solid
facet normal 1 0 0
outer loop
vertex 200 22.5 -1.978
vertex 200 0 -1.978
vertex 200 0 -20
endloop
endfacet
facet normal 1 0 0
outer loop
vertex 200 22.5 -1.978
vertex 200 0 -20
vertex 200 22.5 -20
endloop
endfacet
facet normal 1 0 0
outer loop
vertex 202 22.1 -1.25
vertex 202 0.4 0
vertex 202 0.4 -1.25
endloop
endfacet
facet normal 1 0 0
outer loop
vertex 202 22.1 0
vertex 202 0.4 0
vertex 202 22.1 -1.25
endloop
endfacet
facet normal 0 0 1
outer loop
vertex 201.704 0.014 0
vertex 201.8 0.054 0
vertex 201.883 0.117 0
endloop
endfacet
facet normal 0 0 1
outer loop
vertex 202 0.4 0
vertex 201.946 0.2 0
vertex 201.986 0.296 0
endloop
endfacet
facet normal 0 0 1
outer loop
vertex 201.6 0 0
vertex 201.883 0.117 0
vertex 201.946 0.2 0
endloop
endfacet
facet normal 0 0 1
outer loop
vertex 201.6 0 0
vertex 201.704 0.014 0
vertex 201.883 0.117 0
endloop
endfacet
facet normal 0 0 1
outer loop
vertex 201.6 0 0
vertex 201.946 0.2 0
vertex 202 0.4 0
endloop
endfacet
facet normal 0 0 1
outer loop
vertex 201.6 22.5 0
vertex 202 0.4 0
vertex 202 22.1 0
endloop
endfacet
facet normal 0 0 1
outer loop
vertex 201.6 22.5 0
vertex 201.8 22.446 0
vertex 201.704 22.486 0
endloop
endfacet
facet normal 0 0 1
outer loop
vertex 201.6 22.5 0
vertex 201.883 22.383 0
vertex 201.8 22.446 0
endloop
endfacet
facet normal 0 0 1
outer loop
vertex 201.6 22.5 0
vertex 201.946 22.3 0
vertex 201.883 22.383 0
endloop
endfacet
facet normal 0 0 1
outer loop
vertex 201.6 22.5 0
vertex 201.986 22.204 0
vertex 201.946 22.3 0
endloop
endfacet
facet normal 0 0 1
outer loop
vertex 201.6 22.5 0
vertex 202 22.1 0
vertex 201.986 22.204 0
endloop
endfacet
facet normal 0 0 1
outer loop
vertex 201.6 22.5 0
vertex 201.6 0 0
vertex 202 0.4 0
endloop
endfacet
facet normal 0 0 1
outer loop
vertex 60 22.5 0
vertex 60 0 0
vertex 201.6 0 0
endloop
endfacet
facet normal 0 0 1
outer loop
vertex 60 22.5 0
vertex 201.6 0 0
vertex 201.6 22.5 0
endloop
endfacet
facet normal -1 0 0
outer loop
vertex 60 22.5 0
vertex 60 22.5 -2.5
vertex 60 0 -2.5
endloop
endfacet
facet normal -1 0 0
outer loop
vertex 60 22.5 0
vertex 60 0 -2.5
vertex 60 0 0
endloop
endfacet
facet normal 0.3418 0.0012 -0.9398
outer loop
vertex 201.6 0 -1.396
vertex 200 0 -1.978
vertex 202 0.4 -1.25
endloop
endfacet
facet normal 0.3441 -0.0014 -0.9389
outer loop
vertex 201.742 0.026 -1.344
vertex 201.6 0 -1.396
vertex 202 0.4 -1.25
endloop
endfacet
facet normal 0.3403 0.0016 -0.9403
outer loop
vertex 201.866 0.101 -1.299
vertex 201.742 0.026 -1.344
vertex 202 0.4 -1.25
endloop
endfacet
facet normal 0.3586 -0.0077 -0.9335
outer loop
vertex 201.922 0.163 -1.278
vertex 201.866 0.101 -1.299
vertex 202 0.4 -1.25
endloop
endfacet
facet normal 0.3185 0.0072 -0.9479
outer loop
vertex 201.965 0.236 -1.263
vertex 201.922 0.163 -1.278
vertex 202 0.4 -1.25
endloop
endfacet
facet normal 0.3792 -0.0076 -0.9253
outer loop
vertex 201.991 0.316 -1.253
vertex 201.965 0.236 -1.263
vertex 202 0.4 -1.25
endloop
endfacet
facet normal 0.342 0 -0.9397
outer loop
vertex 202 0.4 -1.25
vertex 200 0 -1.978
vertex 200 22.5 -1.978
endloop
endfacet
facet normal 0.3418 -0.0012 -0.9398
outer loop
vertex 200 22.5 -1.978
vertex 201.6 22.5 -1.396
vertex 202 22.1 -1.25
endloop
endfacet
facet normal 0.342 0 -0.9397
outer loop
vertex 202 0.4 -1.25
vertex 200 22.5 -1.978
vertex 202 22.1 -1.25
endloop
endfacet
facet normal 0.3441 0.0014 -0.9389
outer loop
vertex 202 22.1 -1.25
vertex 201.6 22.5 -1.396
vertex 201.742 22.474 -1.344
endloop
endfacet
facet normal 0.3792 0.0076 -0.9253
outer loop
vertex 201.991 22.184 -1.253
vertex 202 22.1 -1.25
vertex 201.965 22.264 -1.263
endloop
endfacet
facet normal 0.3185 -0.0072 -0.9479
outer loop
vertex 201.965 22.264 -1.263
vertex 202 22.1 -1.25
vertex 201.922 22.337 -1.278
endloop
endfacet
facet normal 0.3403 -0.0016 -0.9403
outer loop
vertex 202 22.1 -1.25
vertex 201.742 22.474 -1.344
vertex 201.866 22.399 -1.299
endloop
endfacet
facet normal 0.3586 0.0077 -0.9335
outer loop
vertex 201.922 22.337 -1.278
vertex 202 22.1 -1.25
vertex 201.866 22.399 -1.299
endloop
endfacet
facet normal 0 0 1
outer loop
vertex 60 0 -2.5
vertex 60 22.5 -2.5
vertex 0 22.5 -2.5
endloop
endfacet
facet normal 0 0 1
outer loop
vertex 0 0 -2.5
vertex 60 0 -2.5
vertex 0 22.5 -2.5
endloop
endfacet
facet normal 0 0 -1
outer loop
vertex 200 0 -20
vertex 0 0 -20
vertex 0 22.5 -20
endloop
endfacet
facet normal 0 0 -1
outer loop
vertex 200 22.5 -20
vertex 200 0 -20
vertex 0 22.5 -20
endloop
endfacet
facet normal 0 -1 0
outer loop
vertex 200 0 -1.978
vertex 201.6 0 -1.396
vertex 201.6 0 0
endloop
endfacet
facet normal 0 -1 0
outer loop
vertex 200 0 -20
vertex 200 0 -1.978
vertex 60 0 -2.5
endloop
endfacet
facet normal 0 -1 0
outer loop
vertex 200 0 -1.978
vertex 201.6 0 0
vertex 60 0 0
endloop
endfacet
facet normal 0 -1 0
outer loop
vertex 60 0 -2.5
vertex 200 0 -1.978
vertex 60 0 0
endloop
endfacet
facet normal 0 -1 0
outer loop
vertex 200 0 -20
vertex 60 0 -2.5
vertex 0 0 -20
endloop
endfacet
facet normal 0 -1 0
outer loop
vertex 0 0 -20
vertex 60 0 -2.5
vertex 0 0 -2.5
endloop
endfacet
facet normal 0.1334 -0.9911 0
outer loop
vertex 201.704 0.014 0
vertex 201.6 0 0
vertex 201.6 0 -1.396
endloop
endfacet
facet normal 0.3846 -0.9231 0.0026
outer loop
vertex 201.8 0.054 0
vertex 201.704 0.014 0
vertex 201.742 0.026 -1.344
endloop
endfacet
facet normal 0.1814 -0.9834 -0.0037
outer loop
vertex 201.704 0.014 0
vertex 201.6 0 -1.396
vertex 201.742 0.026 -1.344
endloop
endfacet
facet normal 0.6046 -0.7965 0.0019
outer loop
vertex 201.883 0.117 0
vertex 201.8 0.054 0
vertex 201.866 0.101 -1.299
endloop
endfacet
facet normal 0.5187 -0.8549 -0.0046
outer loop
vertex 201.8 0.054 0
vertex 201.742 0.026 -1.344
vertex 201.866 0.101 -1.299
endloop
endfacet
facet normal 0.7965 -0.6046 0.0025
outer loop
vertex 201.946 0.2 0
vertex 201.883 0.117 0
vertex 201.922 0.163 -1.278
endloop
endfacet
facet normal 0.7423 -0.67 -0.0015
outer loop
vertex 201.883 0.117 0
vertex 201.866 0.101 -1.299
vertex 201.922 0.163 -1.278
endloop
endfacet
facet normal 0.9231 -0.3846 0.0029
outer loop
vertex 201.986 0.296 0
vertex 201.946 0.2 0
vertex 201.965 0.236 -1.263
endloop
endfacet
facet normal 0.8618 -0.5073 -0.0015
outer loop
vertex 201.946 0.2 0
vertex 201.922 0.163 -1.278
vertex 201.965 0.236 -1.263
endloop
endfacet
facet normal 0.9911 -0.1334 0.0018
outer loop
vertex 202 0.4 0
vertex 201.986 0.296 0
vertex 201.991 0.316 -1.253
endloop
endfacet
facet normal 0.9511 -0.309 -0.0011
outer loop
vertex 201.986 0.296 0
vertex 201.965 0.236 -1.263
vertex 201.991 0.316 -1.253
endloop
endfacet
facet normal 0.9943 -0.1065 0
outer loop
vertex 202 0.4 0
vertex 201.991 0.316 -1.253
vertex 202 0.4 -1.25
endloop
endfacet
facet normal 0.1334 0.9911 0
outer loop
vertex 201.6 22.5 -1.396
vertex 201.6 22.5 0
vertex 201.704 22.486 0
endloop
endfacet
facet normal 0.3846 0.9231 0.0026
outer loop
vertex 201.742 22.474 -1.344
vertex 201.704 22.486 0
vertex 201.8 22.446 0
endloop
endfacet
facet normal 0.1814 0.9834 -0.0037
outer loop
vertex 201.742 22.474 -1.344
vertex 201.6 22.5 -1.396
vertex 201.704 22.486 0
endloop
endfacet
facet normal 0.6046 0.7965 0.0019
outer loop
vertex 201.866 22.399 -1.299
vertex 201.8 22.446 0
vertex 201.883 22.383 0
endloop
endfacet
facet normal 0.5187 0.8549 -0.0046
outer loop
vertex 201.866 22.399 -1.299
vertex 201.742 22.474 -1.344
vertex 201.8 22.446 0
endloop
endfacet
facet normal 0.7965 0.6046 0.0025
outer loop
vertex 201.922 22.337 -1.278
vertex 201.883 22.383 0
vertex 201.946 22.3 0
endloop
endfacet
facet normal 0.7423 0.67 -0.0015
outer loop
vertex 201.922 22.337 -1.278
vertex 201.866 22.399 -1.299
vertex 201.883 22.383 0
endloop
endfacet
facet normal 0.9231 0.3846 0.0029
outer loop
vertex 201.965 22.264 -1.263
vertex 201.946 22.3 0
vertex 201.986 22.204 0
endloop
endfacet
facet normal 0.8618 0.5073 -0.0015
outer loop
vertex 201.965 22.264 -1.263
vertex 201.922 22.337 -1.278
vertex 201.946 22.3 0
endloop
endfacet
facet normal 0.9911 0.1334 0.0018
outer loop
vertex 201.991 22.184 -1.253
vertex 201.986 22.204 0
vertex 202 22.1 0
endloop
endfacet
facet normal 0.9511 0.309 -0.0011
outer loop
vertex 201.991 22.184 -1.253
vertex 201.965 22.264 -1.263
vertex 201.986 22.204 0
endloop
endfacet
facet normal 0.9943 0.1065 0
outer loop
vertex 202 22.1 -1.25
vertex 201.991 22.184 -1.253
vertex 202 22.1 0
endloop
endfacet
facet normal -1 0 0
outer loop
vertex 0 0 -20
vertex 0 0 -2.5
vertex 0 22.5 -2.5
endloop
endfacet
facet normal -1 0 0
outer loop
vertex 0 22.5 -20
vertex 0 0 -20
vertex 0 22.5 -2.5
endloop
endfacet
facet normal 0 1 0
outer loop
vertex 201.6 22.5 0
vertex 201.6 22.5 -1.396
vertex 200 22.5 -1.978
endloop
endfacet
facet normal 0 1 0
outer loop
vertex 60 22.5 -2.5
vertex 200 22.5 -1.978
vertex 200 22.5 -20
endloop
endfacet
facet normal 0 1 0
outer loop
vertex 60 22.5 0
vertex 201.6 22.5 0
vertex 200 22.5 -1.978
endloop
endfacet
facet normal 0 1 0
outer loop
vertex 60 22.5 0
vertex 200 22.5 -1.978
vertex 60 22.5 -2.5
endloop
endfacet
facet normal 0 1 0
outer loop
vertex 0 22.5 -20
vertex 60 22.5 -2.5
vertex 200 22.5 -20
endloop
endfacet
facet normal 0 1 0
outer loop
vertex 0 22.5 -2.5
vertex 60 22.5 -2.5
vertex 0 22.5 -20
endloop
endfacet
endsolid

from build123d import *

# Parameters (mm, degrees)
SKETCH1_W           = 22.5
SKETCH1_H           = 202
BOSS_EXTRUDE1_DEPTH = 20
SKETCH2_W           = 22.5
SKETCH2_H           = 18
CUT_EXTRUDE1_DEPTH  = 2
CHAMFER5_SIZE       = 2.060608065
CHAMFER5_SIZE_2     = 0.75
FILLET5_R           = 0.4
SKETCH3_W           = 60
SKETCH3_H           = 2.5
CUT_EXTRUDE2_DEPTH  = 22.5


with BuildPart() as part:
    # Sketch1 → Boss-Extrude1 (new body)
    with BuildSketch(Plane(origin=(0, 0, 0), x_dir=(0, 1, 0), z_dir=(0, 0, 1))):
        with Locations((11.25, -101)):
            Rectangle(SKETCH1_W, SKETCH1_H)
    extrude(amount=-BOSS_EXTRUDE1_DEPTH)

    # Sketch2 → Cut-Extrude1 (cut)
    with BuildSketch(Plane.YZ.offset(202)):
        with Locations((11.25, -11)):
            Rectangle(SKETCH2_W, SKETCH2_H)
    extrude(amount=-CUT_EXTRUDE1_DEPTH, mode=Mode.SUBTRACT)

    # Chamfer5
    # the kernel refuses this chamfer: 2.060608065, 0.75 mm, written as the material it takes off along each edge
    with BuildSketch(Plane(origin=(202, 27.845618587, -2), x_dir=(-0.9999130865277316, 0, -0.013184058198645886), z_dir=(0, -1, 0))) as chamfer5_piece_1_section:
        Polygon((CHAMFER5_SIZE * 0.999913086329, -CHAMFER5_SIZE * 0.013184058196), (-CHAMFER5_SIZE_2 * 0.0131840581986, -CHAMFER5_SIZE_2 * 0.999913086528), (0, 0), align=None)
    chamfer5_piece_1 = extrude(amount=33.191237174, mode=Mode.PRIVATE)
    chamfer5_piece_1 = split(chamfer5_piece_1, bisect_by=Plane(origin=(200, 11.25, -1.766801206), z_dir=(1, 0, 0)), keep=Keep.TOP, mode=Mode.PRIVATE)
    add(chamfer5_piece_1, mode=Mode.SUBTRACT)

    # Fillet5
    fillet5_edges = [part.edges().sort_by_distance(p)[0] for p in [
        (202, 0, -0.625),
        (202, 22.5, -0.625),
    ]]
    fillet(fillet5_edges, radius=FILLET5_R)

    # Sketch3 → Cut-Extrude2 (cut)
    with BuildSketch(Plane(origin=(0, 22.5, 0), x_dir=(-1, 0, 0), z_dir=(0, 1, 0))):
        with Locations((-30, -1.25)):
            Rectangle(SKETCH3_W, SKETCH3_H)
    extrude(amount=-CUT_EXTRUDE2_DEPTH, mode=Mode.SUBTRACT)


solid = part.part
